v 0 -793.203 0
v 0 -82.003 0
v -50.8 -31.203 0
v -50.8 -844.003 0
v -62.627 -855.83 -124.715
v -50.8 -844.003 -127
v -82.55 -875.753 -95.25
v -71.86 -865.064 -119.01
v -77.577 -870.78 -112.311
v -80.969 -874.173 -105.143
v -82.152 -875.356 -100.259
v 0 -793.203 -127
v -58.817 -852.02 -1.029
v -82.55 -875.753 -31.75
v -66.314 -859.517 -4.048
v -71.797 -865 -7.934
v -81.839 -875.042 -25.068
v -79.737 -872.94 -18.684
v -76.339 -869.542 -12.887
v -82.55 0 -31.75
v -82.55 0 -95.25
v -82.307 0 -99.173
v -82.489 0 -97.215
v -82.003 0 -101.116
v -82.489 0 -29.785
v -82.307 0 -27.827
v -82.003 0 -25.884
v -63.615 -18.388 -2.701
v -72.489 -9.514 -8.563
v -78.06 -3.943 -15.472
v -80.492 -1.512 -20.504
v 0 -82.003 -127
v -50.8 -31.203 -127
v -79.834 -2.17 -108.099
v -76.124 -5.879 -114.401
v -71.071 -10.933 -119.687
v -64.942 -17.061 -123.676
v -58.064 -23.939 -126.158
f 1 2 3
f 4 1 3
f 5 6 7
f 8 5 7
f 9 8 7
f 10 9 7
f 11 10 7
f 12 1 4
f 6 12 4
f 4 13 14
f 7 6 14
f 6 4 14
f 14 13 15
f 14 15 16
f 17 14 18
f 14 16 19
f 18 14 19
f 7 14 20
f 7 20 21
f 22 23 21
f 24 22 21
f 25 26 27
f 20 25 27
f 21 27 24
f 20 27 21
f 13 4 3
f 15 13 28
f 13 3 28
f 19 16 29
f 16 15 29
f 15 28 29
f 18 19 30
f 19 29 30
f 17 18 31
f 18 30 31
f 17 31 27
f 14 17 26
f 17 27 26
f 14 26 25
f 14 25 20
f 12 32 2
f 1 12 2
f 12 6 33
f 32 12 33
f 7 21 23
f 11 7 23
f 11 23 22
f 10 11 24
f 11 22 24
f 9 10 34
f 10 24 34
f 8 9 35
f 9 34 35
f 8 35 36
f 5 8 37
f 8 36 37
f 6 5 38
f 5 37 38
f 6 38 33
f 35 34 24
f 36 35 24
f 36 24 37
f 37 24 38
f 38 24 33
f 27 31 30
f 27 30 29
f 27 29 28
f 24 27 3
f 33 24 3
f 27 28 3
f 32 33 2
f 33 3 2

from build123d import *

# Parameters (mm, degrees)
F1_DEPTH = 1016
F3_DEPTH = 127.001
F5_DEPTH = 127.001


with BuildPart() as f1:
    # F0 (on Front) → F1 (new body)
    with BuildSketch(Plane.XZ):
        with BuildLine():
            Line((0, -127), (0, 0))
            Line((0, 0), (-50.8, 0))
            ThreePointArc((-50.8, 0), (-73.25064, -9.29936), (-82.55, -31.75))
            Line((-82.55, -31.75), (-82.55, -95.25))
            ThreePointArc((-82.55, -95.25), (-73.25064, -117.70064), (-50.8, -127))
            Line((-50.8, -127), (0, -127))
        make_face()
    extrude(amount=F1_DEPTH)

    # F2 (on face) → F3 (cut, through all)
    with BuildSketch(Plane.XY):
        Polygon((0, -82.003355), (0, 0), (-82.003355, 0), align=None)
    extrude(amount=-F3_DEPTH, mode=Mode.SUBTRACT)

    # F4 (on face) → F5 (cut, through all)
    with BuildSketch(Plane.XY):
        Polygon((0, -1016), (0, -793.203355), (-222.796645, -1016), align=None)
    extrude(amount=-F5_DEPTH, mode=Mode.SUBTRACT)


solid = f1.part
